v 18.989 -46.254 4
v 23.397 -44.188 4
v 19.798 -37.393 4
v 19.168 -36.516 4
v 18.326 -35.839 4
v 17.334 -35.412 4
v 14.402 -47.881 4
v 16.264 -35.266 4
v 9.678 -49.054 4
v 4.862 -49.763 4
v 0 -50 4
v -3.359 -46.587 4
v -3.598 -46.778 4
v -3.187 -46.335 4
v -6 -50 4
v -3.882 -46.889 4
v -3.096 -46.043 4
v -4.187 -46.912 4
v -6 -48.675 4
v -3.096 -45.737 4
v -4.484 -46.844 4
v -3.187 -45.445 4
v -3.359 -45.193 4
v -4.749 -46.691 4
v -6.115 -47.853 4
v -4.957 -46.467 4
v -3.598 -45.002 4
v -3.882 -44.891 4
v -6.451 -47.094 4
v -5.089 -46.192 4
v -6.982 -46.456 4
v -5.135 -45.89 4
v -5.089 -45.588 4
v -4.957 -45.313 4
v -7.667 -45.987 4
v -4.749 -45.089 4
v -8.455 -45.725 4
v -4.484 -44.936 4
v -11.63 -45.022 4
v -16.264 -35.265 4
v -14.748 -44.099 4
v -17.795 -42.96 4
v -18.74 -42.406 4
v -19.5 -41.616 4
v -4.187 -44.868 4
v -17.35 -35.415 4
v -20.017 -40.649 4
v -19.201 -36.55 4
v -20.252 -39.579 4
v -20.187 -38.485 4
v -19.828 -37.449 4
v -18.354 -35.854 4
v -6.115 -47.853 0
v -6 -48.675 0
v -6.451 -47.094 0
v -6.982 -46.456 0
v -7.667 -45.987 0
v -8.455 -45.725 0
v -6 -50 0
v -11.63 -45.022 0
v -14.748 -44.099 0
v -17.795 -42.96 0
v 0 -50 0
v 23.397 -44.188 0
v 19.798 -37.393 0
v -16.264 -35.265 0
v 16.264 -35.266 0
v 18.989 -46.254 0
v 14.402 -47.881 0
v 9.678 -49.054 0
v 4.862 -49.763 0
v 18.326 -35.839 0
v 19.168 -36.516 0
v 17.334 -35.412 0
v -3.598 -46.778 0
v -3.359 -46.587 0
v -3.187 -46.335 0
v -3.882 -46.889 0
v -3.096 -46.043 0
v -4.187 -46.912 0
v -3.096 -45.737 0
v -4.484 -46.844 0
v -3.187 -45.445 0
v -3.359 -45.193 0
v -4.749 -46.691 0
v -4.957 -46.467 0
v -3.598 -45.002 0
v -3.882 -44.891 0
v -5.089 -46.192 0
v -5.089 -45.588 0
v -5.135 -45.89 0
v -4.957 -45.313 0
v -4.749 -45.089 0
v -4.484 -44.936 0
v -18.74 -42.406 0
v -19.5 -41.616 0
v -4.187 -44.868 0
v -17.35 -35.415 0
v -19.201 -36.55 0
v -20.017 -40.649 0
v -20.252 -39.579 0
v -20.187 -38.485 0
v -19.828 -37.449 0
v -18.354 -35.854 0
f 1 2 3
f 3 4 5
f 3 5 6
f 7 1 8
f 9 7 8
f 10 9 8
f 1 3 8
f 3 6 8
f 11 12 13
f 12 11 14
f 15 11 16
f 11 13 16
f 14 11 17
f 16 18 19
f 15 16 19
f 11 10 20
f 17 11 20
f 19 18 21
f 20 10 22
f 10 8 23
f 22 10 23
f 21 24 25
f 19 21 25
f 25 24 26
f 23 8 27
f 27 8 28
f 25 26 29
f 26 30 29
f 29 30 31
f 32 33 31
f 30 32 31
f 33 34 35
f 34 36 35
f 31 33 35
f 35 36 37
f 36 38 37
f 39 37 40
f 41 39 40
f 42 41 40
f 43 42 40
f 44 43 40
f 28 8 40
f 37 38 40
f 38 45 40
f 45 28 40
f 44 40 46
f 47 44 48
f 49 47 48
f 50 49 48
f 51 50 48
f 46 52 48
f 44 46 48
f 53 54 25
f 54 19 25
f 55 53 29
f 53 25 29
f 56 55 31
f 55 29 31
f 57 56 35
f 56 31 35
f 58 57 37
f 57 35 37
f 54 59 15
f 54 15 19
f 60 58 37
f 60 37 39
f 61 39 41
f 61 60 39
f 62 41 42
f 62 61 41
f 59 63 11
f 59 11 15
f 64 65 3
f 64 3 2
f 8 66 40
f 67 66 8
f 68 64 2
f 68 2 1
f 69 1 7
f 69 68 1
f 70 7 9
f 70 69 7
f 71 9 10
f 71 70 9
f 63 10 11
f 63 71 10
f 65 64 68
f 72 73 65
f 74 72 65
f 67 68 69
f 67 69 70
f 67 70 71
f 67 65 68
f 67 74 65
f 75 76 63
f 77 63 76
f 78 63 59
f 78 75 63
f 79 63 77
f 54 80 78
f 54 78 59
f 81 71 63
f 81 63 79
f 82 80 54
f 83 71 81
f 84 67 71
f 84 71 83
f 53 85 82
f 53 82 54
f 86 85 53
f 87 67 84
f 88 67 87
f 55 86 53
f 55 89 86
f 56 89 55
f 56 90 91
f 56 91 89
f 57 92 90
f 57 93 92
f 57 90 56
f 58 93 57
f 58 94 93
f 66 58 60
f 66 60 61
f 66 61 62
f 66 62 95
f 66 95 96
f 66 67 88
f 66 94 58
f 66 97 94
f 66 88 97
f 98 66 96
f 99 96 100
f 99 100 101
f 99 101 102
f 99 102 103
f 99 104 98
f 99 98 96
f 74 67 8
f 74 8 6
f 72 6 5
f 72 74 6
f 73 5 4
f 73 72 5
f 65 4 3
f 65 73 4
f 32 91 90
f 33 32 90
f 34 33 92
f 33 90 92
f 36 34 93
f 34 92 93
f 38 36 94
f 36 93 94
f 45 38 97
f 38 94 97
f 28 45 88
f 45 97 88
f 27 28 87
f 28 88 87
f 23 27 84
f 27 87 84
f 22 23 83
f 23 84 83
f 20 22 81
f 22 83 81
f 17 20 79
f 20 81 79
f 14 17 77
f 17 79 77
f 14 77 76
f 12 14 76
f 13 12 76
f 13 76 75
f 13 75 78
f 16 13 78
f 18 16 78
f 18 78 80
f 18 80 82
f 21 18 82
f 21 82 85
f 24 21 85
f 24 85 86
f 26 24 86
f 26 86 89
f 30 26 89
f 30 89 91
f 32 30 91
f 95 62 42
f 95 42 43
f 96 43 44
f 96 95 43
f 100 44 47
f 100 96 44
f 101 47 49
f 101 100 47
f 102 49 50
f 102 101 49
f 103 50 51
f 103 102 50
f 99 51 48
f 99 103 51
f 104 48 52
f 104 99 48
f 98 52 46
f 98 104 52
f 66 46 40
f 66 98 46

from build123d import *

# Parameters (mm, degrees)
EXTRUDE_1_DEPTH = 4
M2_5X0_45_1_D   = 2.05
FILLET_1_R      = 3


with BuildPart() as part:
    # 草图1 → 凸台-拉伸1 (new body)
    with BuildSketch(Plane.XY):
        with BuildLine():
            Line((0, -50), (-6, -50))
            Line((-6, -50), (-6, -46.111278447))
            ThreePointArc((-6, -46.111278447), (-12.001245585, -44.924604666), (-17.794779605, -42.960398262))
            ThreePointArc((-17.794779605, -42.960398262), (-20.187186997, -38.484518844), (-16.264045876, -35.264880132))
            Line((-16.264045876, -35.264880132), (16.264045876, -35.265962637))
            ThreePointArc((16.264045876, -35.265962637), (18.326373898, -35.838782605), (19.797870689, -37.393136741))
            Line((19.797870689, -37.393136741), (23.396904993, -44.188062152))
            ThreePointArc((23.396904993, -44.188062152), (12.053980513, -48.525267169), (0, -50))
        make_face()
    extrude(amount=EXTRUDE_1_DEPTH)

    # M2.5x0.45 螺纹孔1 (through all)
    with Locations(Plane(origin=(-4.11, -45.89, 4), x_dir=(1, 0, 0), z_dir=(0, 0, 1))):
        with Locations((0, 0)):
            Hole(M2_5X0_45_1_D / 2)

    # 圆角1
    fillet_1_edges = [part.edges().sort_by_distance(p)[0] for p in [
        (-6, -46.111278447, 2),
    ]]
    fillet(fillet_1_edges, radius=FILLET_1_R)


solid = part.part
